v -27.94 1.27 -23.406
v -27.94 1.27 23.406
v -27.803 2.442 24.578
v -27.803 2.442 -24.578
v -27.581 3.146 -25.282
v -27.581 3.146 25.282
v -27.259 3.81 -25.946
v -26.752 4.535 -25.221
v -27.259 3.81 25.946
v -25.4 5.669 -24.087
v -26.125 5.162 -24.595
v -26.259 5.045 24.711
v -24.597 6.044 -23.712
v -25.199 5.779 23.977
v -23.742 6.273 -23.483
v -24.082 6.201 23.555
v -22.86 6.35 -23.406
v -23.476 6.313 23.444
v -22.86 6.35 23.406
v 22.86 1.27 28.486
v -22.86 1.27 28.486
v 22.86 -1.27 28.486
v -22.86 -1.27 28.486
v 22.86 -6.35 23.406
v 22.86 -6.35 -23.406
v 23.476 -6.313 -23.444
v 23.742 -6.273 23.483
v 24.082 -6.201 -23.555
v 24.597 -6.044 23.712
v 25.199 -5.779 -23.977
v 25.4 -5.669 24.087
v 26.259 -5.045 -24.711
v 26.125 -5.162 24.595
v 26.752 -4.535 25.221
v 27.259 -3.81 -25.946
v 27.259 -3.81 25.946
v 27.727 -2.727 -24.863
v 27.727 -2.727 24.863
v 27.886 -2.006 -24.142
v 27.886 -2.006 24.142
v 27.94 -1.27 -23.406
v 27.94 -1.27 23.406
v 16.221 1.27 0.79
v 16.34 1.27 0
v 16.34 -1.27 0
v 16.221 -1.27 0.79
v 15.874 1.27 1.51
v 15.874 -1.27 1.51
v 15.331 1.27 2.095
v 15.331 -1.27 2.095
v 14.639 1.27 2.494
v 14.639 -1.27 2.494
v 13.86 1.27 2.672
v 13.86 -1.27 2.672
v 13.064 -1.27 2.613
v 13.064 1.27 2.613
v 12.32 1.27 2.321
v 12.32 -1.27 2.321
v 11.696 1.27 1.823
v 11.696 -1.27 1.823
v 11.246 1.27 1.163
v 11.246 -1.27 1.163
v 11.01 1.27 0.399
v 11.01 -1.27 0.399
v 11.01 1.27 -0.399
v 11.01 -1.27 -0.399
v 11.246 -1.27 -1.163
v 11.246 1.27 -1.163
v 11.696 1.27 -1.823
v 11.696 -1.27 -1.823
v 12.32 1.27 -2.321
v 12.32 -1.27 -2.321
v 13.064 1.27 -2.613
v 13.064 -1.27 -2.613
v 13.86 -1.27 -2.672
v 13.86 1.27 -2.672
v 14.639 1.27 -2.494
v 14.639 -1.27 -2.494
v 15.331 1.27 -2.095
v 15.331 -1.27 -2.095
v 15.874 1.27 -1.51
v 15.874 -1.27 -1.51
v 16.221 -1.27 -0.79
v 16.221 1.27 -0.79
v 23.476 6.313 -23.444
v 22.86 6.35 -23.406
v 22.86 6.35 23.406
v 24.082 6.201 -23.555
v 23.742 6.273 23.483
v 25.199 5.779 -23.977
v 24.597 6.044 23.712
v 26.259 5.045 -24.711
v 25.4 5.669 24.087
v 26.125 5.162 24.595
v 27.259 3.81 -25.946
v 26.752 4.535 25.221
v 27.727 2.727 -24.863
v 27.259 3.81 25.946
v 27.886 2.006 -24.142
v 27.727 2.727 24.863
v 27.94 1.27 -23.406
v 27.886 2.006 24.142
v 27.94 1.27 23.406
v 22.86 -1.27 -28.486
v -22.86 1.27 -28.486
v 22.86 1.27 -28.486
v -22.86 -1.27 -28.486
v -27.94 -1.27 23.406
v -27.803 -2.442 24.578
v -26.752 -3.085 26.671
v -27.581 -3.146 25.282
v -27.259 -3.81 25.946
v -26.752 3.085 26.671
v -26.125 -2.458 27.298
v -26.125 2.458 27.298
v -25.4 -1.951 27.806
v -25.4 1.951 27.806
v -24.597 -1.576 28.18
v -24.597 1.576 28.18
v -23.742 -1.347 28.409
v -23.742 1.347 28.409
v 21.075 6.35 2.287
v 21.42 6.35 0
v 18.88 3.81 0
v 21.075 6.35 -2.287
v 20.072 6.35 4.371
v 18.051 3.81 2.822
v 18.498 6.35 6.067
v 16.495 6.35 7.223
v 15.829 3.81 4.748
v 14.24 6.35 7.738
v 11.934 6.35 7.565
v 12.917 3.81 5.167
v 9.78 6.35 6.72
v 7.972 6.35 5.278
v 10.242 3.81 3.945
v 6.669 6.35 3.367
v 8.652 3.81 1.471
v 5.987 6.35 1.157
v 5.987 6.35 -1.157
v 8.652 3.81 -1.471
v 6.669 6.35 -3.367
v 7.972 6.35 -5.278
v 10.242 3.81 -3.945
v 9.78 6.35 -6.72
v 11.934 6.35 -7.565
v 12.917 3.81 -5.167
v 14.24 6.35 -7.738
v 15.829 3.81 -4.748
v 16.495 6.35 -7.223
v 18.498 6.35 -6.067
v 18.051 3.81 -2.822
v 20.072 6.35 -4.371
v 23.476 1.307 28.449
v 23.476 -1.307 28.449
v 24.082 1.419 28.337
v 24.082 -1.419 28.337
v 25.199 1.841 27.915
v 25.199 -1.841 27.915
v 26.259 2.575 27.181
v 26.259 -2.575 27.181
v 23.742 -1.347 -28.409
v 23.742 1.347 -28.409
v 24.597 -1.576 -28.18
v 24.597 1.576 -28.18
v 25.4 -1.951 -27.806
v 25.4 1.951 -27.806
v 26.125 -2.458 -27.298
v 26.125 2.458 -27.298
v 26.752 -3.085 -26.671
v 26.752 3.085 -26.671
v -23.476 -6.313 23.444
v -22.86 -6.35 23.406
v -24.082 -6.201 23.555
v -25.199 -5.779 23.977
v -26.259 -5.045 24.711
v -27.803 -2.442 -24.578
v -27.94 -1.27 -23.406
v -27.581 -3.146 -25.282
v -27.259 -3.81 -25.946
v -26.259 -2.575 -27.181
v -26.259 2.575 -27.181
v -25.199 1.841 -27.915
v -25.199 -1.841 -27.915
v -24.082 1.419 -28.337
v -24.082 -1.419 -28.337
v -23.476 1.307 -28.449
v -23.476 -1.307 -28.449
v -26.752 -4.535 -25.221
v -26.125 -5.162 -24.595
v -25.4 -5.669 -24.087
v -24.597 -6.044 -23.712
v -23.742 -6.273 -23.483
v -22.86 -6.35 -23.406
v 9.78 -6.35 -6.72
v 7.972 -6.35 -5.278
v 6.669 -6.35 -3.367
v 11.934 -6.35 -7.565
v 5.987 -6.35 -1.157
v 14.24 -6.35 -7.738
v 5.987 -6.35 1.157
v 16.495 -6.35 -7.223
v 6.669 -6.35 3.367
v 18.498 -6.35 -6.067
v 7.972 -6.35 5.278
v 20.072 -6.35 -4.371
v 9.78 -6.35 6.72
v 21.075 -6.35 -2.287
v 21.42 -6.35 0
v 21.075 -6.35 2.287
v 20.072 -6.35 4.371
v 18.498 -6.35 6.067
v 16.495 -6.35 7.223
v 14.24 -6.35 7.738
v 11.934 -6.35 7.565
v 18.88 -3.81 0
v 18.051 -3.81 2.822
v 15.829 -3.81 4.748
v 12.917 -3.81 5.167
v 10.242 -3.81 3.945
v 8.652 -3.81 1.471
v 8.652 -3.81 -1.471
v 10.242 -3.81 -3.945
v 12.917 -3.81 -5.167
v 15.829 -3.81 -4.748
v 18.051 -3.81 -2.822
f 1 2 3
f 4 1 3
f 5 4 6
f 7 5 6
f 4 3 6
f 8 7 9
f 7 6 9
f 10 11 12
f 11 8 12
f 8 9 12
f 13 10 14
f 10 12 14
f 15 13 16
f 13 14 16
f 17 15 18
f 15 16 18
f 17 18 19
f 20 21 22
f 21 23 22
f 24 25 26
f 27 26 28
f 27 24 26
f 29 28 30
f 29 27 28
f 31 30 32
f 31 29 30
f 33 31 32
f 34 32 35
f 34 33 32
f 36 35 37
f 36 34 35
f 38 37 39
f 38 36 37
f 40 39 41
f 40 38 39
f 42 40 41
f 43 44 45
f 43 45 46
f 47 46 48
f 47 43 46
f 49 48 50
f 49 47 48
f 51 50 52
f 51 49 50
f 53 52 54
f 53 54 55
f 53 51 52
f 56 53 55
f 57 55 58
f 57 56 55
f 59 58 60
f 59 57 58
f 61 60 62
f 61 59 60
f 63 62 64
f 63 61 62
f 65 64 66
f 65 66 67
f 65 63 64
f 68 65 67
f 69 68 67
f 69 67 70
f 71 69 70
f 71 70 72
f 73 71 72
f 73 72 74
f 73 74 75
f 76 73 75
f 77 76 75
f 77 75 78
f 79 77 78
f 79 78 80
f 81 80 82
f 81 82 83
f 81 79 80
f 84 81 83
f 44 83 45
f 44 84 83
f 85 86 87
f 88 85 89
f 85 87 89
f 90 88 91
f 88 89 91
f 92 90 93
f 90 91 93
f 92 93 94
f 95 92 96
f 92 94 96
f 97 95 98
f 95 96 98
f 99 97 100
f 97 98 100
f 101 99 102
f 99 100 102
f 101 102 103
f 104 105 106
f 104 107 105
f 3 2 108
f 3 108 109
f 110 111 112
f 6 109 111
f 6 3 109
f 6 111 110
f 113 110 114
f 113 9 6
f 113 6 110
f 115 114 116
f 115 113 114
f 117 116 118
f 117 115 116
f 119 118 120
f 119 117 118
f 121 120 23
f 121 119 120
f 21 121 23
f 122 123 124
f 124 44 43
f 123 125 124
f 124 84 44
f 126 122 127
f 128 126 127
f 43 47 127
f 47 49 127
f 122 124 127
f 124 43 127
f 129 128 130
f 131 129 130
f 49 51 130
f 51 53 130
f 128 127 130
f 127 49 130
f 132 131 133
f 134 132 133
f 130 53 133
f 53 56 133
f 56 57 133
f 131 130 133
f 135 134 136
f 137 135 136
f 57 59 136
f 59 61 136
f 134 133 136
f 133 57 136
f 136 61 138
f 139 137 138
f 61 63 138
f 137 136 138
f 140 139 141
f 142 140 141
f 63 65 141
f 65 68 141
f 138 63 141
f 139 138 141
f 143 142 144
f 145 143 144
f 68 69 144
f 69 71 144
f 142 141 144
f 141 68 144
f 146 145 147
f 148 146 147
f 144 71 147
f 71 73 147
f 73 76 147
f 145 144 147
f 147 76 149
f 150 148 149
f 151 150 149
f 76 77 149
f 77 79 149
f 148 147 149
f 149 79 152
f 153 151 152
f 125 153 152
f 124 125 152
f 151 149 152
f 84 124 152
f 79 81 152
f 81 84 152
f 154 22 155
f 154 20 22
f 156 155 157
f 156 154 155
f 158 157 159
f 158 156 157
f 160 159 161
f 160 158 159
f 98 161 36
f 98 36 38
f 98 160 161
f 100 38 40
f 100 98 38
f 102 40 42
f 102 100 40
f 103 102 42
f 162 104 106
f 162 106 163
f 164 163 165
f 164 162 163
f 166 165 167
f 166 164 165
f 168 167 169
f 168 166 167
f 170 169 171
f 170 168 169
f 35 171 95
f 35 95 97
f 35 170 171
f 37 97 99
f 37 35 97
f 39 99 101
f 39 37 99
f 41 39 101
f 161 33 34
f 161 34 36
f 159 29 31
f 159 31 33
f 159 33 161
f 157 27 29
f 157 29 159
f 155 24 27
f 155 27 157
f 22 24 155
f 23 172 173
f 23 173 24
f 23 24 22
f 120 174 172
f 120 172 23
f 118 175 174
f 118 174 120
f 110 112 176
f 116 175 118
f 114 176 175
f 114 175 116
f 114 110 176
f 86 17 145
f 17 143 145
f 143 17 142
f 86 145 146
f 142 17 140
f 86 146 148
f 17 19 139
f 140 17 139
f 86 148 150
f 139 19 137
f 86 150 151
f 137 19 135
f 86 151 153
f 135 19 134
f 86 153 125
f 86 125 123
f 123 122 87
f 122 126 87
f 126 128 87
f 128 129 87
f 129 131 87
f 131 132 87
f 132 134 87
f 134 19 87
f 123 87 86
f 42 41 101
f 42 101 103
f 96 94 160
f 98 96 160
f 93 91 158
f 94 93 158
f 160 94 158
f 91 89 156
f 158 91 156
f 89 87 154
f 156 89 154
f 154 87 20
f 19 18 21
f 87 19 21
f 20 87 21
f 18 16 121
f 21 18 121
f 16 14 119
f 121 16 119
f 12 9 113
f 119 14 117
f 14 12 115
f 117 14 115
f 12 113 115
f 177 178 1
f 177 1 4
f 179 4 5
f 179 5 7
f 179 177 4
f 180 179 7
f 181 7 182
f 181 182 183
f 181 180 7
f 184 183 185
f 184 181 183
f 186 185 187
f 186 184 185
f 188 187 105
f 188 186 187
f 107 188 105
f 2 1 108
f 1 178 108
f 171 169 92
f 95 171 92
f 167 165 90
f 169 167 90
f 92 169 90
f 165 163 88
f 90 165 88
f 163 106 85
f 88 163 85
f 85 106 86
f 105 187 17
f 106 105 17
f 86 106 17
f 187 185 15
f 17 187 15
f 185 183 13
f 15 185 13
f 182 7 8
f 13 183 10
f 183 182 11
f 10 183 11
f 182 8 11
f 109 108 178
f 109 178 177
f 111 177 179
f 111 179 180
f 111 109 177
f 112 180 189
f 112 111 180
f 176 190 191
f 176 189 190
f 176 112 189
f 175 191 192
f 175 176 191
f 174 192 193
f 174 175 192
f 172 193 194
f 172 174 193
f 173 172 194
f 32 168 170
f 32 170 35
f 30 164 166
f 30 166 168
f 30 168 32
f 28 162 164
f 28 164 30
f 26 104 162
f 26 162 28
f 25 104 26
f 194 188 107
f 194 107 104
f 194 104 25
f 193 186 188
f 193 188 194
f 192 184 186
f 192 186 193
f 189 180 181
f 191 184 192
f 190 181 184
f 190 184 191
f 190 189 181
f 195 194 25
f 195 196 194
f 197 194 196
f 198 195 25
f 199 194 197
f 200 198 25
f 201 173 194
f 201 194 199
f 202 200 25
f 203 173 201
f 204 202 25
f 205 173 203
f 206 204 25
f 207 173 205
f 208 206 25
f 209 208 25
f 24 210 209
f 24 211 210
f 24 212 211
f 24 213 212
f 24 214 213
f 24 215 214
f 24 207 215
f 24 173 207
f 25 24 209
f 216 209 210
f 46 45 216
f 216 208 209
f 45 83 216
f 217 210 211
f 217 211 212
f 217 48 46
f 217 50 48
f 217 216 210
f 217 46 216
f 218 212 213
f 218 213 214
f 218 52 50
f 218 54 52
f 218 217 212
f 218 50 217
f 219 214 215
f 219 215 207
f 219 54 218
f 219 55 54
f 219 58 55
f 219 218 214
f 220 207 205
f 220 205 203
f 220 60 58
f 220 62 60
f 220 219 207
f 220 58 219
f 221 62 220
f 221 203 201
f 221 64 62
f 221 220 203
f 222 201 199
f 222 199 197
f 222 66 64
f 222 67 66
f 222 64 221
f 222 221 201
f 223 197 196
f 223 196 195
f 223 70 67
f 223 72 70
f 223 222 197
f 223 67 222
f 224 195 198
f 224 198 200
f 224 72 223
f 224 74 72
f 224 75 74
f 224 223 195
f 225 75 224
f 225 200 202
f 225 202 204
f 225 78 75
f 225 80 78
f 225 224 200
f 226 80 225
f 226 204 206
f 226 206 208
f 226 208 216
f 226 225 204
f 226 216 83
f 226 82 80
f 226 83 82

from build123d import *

# Parameters (mm, degrees)
F0_W        = 55.88
F0_H        = 56.9722
F0_R        = 2.6797
F1_DEPTH    = 6.35
F2_R        = 5.08
F3_R        = 5.08
F4_T1_DEPTH = 71.8482991577
F5_T1_DEPTH = 71.8482991577


# Not quite as in the source:
# - a fillet or chamfer that OpenCascade refuses, or shapes differently, is made with other operations: its cross-section is extruded or revolved along the edge and cut away or added


with BuildPart() as f1:
    # F0 (on Front) → F1 (new body, symmetric)
    with BuildSketch(Plane.XZ):
        Rectangle(F0_W, F0_H)
        with Locations((13.660245575, 0)):
            Circle(F0_R, mode=Mode.SUBTRACT)
    extrude(amount=F1_DEPTH, both=True)

    # F2
    f2_edges = [f1.edges().sort_by_distance(p)[0] for p in [
        (-27.94, 6.35, 0),
        (-27.94, 0, -28.4861),
        (-27.94, -6.35, 0),
        (-27.94, 0, 28.4861),
    ]]
    fillet(f2_edges, radius=F2_R)

    # F3
    f3_edges = [f1.edges().sort_by_distance(p)[0] for p in [
        (27.94, 0, -28.4861),
        (27.94, 6.35, 0),
        (27.94, 0, 28.4861),
        (27.94, -6.35, 0),
    ]]
    fillet(f3_edges, radius=F3_R)

    # F4: chamfer of 5.08 on 5 edges, made by hand

    # F4_s2 → F4_t1 (cut)
    with BuildSketch(Plane.YZ.offset(-35.9241495789)):
        Polygon((-1.27, -28.4861), (-6.35, -23.4061), (-6.35, -28.4861), align=None)
        Polygon((-6.35, 23.4061), (-1.27, 28.4861), (-6.35, 28.4861), align=None)
    extrude(amount=F4_T1_DEPTH, mode=Mode.SUBTRACT)

    # F4_s3 → F4_t4 (revolve, cut)
    with BuildSketch(Plane.XY):
        Polygon((21.419945575, -6.35), (16.339945575, -1.27), (16.339945575, -6.35), align=None)
    revolve(axis=Axis((13.660245575, -6.35, 0), (0, -1, 0)), mode=Mode.SUBTRACT)

    # F5: chamfer of 5.08 on 5 edges, made by hand

    # F5_s2 → F5_t1 (cut)
    with BuildSketch(Plane.YZ.offset(-35.9241495789)):
        Polygon((1.27, -28.4861), (6.35, -23.4061), (6.35, -28.4861), align=None)
        Polygon((6.35, 23.4061), (1.27, 28.4861), (6.35, 28.4861), align=None)
    extrude(amount=F5_T1_DEPTH, mode=Mode.SUBTRACT)

    # F5_s3 → F5_t4 (revolve, cut)
    with BuildSketch(Plane.XY):
        Polygon((21.419945575, 6.35), (16.339945575, 1.27), (16.339945575, 6.35), align=None)
    revolve(axis=Axis((13.660245575, 6.35, 0), (0, -1, 0)), mode=Mode.SUBTRACT)


solid = f1.part
